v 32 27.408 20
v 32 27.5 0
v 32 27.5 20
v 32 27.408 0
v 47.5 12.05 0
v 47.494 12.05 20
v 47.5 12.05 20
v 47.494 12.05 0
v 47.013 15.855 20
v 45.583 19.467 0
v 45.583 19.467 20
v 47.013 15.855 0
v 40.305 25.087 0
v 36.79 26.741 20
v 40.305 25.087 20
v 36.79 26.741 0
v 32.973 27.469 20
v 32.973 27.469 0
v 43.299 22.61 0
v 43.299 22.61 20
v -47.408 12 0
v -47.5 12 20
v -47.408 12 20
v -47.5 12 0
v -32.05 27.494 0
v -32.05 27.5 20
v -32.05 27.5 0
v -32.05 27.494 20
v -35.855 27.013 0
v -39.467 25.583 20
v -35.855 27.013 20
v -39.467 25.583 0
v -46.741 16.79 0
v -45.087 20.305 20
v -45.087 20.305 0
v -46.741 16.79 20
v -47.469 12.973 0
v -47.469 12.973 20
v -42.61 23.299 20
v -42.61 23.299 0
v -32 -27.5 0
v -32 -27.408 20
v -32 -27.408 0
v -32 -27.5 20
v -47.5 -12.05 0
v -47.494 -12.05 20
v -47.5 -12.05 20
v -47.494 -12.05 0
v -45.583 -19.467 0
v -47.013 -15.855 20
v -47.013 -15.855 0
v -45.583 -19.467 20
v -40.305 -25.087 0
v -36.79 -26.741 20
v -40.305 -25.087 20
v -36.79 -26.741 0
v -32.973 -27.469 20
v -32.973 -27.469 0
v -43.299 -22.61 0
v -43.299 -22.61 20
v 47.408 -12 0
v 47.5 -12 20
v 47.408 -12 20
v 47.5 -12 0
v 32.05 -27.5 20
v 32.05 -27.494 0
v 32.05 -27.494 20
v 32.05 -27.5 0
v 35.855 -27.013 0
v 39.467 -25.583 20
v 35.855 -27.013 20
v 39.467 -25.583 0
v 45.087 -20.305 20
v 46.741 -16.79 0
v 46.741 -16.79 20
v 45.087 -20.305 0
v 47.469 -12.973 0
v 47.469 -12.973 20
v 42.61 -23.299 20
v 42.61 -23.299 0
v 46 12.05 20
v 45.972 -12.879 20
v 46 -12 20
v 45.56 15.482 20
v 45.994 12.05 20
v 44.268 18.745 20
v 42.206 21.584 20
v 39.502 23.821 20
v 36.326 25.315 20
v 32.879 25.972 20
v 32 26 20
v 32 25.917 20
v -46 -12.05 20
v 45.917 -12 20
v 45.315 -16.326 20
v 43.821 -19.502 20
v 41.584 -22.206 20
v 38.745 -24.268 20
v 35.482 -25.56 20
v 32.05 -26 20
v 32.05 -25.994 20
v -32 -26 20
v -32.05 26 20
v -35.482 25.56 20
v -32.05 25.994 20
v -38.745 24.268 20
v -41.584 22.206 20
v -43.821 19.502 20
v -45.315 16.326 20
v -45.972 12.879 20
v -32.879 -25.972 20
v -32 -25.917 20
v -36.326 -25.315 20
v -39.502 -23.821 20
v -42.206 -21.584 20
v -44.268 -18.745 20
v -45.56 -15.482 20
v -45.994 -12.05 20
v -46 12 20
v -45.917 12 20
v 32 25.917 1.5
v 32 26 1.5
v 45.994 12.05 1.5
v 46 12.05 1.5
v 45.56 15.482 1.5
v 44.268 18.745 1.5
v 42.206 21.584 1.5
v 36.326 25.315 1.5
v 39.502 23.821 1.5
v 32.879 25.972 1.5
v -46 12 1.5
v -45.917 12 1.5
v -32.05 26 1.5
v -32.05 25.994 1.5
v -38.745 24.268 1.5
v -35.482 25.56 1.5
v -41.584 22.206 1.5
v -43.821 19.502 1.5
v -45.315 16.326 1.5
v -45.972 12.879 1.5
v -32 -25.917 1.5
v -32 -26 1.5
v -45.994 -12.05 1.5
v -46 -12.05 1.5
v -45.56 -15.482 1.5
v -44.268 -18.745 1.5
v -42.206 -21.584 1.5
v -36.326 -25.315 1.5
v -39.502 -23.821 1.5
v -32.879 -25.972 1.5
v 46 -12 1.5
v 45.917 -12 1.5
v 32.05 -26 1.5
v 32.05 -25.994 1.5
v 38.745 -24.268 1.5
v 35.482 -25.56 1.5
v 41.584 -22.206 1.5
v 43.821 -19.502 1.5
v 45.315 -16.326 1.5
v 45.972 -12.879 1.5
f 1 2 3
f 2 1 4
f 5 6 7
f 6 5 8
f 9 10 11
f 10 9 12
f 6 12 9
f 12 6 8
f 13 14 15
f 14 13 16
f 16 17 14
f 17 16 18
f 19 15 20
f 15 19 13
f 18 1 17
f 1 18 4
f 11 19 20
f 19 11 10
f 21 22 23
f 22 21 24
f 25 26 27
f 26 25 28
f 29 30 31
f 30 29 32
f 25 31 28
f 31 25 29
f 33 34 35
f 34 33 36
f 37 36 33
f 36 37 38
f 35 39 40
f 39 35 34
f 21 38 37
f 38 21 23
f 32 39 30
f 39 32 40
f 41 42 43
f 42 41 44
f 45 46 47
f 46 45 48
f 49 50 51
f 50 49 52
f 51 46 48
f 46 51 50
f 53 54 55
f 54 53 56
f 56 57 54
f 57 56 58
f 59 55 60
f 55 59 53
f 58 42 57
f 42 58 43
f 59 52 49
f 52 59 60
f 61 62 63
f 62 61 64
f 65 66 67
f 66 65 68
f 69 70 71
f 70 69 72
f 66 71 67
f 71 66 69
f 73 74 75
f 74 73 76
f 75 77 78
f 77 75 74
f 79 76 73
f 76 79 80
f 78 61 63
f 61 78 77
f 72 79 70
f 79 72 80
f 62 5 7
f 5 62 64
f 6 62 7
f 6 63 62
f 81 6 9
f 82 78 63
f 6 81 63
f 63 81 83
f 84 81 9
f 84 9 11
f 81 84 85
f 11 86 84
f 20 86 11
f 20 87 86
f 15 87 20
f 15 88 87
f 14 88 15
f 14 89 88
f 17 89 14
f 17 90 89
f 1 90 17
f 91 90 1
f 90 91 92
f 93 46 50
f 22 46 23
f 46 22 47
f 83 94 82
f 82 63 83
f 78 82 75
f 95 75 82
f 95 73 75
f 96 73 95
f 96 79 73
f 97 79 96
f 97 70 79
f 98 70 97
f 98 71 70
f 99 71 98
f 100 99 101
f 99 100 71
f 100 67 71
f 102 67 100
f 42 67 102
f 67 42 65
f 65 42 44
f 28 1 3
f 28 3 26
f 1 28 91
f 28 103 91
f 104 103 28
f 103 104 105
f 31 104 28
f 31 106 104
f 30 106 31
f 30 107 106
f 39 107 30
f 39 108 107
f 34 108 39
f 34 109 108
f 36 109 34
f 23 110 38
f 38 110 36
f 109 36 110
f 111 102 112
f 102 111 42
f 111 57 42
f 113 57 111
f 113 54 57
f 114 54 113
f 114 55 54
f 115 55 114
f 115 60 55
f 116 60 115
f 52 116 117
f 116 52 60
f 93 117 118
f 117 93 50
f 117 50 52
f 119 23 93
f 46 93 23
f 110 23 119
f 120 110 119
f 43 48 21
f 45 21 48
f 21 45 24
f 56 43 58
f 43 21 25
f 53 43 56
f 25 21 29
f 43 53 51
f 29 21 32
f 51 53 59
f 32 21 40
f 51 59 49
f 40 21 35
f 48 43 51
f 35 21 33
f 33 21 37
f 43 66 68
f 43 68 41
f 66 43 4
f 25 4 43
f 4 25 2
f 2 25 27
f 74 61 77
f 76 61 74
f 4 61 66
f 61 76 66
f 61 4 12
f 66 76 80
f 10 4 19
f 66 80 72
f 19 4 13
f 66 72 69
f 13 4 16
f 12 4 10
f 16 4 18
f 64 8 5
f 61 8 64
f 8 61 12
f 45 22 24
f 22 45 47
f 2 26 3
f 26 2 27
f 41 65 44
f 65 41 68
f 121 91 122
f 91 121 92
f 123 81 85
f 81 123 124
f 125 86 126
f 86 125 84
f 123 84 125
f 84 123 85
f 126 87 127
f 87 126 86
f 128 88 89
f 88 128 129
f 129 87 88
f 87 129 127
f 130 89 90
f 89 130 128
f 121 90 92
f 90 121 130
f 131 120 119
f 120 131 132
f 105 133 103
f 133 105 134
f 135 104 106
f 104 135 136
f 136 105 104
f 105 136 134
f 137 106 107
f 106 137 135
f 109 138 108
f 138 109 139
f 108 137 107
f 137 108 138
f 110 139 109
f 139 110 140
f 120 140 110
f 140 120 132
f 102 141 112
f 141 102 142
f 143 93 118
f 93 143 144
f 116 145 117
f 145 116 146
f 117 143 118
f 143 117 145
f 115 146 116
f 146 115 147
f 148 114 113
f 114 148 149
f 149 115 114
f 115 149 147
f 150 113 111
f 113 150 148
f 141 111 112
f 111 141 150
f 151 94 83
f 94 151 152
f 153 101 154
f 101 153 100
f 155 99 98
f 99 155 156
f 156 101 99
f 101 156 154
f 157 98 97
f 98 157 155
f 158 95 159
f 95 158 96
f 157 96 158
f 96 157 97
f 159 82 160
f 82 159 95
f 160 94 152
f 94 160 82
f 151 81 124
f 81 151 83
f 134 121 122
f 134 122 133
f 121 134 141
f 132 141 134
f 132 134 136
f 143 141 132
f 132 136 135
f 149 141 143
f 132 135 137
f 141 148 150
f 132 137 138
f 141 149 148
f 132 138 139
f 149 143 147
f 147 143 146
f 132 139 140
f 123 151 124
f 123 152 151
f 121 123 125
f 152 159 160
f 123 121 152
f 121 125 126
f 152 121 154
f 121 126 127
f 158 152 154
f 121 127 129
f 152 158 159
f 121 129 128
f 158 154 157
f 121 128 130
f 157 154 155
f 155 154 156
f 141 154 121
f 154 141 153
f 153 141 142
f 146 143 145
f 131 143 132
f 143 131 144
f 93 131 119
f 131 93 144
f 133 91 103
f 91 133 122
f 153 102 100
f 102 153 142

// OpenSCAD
difference() {
translate([0,0,10])
roundCornersCube(95,55,20,15.5);
translate([0,0,13.5])
roundCornersCube(92,52,24,14);
}



module createMeniscus(h,radius) // This module creates the shape that needs to be substracted from a cube to make its corners rounded.
difference(){        //This shape is basicly the difference between a quarter of cylinder and a cube
   translate([radius/2+0.1,radius/2+0.1,0]){
      cube([radius+0.2,radius+0.1,h+0.2],center=true);         // All that 0.x numbers are to avoid "ghost boundaries" when substracting
   }

   cylinder(h=h+0.2,r=radius,$fn = 25,center=true);
}


module roundCornersCube(x,y,z,r)  // Now we just substract the shape we have created in the four corners
difference(){
   cube([x,y,z], center=true);

translate([x/2-r,y/2-r]){  // We move to the first corner (x,y)
      rotate(0){  
         createMeniscus(z,r); // And substract the meniscus
      }
   }
   translate([-x/2+r,y/2-r]){ // To the second corner (-x,y)
      rotate(90){
         createMeniscus(z,r); // But this time we have to rotate the meniscus 90 deg
      }
   }
      translate([-x/2+r,-y/2+r]){ // ... 
      rotate(180){
         createMeniscus(z,r);
      }
   }
      translate([x/2-r,-y/2+r]){
      rotate(270){
         createMeniscus(z,r);
      }
   }
}
